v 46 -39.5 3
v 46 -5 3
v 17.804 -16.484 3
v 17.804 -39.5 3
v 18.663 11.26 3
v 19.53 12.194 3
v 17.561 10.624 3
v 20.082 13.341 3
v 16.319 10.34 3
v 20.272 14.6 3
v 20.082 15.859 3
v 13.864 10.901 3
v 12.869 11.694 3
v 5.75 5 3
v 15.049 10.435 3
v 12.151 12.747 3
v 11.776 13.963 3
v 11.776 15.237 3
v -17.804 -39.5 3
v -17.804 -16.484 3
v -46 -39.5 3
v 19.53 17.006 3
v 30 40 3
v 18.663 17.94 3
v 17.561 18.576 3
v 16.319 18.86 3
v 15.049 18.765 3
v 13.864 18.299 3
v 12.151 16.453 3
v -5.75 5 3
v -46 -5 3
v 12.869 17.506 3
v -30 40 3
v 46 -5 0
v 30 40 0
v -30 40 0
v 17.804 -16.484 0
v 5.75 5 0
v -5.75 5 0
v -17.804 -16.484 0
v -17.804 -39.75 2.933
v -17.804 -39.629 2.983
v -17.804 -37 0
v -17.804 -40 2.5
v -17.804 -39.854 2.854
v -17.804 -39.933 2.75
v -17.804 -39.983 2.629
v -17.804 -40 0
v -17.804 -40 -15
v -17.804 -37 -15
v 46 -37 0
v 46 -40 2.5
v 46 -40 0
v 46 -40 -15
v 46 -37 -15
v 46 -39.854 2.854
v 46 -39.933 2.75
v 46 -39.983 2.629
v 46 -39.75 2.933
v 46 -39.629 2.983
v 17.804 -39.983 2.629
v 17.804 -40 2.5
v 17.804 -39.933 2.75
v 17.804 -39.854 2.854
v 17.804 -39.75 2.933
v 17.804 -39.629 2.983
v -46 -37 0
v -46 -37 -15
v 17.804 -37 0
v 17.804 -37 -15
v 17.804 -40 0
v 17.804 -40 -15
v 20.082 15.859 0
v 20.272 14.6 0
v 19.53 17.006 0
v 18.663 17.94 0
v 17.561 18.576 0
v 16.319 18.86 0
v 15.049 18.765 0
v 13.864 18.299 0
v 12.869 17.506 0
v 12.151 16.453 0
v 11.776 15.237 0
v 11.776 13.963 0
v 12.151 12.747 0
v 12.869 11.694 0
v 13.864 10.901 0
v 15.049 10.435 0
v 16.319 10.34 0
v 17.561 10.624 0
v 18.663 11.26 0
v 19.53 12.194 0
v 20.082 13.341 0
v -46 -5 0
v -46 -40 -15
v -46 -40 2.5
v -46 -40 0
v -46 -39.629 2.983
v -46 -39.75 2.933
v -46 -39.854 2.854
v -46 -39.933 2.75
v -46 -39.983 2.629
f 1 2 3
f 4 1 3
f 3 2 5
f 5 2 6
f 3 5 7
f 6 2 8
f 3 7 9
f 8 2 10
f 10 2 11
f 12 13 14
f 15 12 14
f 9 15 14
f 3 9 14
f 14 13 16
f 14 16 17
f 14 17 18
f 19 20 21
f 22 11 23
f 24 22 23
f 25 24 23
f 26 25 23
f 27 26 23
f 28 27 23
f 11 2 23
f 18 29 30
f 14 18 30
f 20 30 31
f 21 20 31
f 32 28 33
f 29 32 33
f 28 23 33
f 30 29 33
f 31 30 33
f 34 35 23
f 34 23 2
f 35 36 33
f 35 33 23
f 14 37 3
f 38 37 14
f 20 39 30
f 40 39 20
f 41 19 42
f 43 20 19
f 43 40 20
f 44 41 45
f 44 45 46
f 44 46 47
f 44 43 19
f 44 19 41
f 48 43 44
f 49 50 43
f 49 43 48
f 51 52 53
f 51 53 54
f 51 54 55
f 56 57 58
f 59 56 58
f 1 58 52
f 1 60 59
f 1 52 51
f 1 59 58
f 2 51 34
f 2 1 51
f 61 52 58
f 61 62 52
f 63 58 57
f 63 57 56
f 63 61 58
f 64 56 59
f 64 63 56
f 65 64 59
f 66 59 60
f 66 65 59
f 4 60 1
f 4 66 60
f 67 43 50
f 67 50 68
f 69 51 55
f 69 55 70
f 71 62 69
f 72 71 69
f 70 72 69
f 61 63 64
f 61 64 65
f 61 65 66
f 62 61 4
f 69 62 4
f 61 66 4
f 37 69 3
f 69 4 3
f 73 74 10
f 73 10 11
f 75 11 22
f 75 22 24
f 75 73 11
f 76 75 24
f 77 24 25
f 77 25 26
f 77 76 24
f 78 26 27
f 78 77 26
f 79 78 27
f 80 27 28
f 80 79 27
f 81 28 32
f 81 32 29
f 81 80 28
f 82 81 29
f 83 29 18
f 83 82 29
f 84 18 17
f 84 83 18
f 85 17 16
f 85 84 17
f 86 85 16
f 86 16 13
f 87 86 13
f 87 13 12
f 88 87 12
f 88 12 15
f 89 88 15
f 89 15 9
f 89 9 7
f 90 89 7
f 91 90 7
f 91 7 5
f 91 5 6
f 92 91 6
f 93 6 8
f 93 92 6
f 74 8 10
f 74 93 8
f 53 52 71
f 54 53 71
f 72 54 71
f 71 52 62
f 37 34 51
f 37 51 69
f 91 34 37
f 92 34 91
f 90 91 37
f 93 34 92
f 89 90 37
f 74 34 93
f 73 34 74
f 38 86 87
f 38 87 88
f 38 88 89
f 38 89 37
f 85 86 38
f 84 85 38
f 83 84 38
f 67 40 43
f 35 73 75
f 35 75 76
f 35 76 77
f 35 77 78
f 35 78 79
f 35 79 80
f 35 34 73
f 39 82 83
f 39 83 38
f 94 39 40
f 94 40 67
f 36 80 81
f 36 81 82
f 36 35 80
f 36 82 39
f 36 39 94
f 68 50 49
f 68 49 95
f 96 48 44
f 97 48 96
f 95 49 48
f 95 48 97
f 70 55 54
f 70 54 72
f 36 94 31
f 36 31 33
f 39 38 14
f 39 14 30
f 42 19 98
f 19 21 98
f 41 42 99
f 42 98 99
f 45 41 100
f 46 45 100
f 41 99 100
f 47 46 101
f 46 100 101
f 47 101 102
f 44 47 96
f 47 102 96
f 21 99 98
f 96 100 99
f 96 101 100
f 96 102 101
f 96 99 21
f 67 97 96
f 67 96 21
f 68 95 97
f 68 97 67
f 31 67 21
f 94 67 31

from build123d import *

# Parameters (mm, degrees)
CROQUIS1_R              = 4.271780476
SALIENTE_EXTRUIR1_DEPTH = 3
CROQUIS2_W              = 28.196158727
CROQUIS2_H              = 3
SALIENTE_EXTRUIR2_DEPTH = 15
REDONDEO1_R             = 0.5


with BuildPart() as part:
    # Croquis1 → Saliente-Extruir1 (new body)
    with BuildSketch(Plane.XY):
        Polygon((-46, -40), (-46, -5), (-30, 40), (30, 40), (46, -5), (46, -40), (17.803841273, -40), (17.803841273, -16.484284277), (5.75, 5), (-5.75, 5), (-17.803841273, -16.484284277), (-17.803841273, -40), align=None)
        with Locations((16, 14.6)):
            Circle(CROQUIS1_R, mode=Mode.SUBTRACT)
    extrude(amount=SALIENTE_EXTRUIR1_DEPTH)

    # Croquis2 → Saliente-Extruir2 (add)
    with BuildSketch(Plane(origin=(0, 0, 0), x_dir=(-1, 0, 0), z_dir=(0, 0, -1))):
        with Locations((-31.901920637, -38.5)):
            Rectangle(CROQUIS2_W, CROQUIS2_H)
        with Locations((31.901920637, -38.5)):
            Rectangle(CROQUIS2_W, CROQUIS2_H)
    extrude(amount=SALIENTE_EXTRUIR2_DEPTH)

    # Redondeo1
    redondeo1_edges = [part.edges().sort_by_distance(p)[0] for p in [
        (-31.901920636, -40, 3),
        (31.901920636, -40, 3),
    ]]
    fillet(redondeo1_edges, radius=REDONDEO1_R)


solid = part.part
